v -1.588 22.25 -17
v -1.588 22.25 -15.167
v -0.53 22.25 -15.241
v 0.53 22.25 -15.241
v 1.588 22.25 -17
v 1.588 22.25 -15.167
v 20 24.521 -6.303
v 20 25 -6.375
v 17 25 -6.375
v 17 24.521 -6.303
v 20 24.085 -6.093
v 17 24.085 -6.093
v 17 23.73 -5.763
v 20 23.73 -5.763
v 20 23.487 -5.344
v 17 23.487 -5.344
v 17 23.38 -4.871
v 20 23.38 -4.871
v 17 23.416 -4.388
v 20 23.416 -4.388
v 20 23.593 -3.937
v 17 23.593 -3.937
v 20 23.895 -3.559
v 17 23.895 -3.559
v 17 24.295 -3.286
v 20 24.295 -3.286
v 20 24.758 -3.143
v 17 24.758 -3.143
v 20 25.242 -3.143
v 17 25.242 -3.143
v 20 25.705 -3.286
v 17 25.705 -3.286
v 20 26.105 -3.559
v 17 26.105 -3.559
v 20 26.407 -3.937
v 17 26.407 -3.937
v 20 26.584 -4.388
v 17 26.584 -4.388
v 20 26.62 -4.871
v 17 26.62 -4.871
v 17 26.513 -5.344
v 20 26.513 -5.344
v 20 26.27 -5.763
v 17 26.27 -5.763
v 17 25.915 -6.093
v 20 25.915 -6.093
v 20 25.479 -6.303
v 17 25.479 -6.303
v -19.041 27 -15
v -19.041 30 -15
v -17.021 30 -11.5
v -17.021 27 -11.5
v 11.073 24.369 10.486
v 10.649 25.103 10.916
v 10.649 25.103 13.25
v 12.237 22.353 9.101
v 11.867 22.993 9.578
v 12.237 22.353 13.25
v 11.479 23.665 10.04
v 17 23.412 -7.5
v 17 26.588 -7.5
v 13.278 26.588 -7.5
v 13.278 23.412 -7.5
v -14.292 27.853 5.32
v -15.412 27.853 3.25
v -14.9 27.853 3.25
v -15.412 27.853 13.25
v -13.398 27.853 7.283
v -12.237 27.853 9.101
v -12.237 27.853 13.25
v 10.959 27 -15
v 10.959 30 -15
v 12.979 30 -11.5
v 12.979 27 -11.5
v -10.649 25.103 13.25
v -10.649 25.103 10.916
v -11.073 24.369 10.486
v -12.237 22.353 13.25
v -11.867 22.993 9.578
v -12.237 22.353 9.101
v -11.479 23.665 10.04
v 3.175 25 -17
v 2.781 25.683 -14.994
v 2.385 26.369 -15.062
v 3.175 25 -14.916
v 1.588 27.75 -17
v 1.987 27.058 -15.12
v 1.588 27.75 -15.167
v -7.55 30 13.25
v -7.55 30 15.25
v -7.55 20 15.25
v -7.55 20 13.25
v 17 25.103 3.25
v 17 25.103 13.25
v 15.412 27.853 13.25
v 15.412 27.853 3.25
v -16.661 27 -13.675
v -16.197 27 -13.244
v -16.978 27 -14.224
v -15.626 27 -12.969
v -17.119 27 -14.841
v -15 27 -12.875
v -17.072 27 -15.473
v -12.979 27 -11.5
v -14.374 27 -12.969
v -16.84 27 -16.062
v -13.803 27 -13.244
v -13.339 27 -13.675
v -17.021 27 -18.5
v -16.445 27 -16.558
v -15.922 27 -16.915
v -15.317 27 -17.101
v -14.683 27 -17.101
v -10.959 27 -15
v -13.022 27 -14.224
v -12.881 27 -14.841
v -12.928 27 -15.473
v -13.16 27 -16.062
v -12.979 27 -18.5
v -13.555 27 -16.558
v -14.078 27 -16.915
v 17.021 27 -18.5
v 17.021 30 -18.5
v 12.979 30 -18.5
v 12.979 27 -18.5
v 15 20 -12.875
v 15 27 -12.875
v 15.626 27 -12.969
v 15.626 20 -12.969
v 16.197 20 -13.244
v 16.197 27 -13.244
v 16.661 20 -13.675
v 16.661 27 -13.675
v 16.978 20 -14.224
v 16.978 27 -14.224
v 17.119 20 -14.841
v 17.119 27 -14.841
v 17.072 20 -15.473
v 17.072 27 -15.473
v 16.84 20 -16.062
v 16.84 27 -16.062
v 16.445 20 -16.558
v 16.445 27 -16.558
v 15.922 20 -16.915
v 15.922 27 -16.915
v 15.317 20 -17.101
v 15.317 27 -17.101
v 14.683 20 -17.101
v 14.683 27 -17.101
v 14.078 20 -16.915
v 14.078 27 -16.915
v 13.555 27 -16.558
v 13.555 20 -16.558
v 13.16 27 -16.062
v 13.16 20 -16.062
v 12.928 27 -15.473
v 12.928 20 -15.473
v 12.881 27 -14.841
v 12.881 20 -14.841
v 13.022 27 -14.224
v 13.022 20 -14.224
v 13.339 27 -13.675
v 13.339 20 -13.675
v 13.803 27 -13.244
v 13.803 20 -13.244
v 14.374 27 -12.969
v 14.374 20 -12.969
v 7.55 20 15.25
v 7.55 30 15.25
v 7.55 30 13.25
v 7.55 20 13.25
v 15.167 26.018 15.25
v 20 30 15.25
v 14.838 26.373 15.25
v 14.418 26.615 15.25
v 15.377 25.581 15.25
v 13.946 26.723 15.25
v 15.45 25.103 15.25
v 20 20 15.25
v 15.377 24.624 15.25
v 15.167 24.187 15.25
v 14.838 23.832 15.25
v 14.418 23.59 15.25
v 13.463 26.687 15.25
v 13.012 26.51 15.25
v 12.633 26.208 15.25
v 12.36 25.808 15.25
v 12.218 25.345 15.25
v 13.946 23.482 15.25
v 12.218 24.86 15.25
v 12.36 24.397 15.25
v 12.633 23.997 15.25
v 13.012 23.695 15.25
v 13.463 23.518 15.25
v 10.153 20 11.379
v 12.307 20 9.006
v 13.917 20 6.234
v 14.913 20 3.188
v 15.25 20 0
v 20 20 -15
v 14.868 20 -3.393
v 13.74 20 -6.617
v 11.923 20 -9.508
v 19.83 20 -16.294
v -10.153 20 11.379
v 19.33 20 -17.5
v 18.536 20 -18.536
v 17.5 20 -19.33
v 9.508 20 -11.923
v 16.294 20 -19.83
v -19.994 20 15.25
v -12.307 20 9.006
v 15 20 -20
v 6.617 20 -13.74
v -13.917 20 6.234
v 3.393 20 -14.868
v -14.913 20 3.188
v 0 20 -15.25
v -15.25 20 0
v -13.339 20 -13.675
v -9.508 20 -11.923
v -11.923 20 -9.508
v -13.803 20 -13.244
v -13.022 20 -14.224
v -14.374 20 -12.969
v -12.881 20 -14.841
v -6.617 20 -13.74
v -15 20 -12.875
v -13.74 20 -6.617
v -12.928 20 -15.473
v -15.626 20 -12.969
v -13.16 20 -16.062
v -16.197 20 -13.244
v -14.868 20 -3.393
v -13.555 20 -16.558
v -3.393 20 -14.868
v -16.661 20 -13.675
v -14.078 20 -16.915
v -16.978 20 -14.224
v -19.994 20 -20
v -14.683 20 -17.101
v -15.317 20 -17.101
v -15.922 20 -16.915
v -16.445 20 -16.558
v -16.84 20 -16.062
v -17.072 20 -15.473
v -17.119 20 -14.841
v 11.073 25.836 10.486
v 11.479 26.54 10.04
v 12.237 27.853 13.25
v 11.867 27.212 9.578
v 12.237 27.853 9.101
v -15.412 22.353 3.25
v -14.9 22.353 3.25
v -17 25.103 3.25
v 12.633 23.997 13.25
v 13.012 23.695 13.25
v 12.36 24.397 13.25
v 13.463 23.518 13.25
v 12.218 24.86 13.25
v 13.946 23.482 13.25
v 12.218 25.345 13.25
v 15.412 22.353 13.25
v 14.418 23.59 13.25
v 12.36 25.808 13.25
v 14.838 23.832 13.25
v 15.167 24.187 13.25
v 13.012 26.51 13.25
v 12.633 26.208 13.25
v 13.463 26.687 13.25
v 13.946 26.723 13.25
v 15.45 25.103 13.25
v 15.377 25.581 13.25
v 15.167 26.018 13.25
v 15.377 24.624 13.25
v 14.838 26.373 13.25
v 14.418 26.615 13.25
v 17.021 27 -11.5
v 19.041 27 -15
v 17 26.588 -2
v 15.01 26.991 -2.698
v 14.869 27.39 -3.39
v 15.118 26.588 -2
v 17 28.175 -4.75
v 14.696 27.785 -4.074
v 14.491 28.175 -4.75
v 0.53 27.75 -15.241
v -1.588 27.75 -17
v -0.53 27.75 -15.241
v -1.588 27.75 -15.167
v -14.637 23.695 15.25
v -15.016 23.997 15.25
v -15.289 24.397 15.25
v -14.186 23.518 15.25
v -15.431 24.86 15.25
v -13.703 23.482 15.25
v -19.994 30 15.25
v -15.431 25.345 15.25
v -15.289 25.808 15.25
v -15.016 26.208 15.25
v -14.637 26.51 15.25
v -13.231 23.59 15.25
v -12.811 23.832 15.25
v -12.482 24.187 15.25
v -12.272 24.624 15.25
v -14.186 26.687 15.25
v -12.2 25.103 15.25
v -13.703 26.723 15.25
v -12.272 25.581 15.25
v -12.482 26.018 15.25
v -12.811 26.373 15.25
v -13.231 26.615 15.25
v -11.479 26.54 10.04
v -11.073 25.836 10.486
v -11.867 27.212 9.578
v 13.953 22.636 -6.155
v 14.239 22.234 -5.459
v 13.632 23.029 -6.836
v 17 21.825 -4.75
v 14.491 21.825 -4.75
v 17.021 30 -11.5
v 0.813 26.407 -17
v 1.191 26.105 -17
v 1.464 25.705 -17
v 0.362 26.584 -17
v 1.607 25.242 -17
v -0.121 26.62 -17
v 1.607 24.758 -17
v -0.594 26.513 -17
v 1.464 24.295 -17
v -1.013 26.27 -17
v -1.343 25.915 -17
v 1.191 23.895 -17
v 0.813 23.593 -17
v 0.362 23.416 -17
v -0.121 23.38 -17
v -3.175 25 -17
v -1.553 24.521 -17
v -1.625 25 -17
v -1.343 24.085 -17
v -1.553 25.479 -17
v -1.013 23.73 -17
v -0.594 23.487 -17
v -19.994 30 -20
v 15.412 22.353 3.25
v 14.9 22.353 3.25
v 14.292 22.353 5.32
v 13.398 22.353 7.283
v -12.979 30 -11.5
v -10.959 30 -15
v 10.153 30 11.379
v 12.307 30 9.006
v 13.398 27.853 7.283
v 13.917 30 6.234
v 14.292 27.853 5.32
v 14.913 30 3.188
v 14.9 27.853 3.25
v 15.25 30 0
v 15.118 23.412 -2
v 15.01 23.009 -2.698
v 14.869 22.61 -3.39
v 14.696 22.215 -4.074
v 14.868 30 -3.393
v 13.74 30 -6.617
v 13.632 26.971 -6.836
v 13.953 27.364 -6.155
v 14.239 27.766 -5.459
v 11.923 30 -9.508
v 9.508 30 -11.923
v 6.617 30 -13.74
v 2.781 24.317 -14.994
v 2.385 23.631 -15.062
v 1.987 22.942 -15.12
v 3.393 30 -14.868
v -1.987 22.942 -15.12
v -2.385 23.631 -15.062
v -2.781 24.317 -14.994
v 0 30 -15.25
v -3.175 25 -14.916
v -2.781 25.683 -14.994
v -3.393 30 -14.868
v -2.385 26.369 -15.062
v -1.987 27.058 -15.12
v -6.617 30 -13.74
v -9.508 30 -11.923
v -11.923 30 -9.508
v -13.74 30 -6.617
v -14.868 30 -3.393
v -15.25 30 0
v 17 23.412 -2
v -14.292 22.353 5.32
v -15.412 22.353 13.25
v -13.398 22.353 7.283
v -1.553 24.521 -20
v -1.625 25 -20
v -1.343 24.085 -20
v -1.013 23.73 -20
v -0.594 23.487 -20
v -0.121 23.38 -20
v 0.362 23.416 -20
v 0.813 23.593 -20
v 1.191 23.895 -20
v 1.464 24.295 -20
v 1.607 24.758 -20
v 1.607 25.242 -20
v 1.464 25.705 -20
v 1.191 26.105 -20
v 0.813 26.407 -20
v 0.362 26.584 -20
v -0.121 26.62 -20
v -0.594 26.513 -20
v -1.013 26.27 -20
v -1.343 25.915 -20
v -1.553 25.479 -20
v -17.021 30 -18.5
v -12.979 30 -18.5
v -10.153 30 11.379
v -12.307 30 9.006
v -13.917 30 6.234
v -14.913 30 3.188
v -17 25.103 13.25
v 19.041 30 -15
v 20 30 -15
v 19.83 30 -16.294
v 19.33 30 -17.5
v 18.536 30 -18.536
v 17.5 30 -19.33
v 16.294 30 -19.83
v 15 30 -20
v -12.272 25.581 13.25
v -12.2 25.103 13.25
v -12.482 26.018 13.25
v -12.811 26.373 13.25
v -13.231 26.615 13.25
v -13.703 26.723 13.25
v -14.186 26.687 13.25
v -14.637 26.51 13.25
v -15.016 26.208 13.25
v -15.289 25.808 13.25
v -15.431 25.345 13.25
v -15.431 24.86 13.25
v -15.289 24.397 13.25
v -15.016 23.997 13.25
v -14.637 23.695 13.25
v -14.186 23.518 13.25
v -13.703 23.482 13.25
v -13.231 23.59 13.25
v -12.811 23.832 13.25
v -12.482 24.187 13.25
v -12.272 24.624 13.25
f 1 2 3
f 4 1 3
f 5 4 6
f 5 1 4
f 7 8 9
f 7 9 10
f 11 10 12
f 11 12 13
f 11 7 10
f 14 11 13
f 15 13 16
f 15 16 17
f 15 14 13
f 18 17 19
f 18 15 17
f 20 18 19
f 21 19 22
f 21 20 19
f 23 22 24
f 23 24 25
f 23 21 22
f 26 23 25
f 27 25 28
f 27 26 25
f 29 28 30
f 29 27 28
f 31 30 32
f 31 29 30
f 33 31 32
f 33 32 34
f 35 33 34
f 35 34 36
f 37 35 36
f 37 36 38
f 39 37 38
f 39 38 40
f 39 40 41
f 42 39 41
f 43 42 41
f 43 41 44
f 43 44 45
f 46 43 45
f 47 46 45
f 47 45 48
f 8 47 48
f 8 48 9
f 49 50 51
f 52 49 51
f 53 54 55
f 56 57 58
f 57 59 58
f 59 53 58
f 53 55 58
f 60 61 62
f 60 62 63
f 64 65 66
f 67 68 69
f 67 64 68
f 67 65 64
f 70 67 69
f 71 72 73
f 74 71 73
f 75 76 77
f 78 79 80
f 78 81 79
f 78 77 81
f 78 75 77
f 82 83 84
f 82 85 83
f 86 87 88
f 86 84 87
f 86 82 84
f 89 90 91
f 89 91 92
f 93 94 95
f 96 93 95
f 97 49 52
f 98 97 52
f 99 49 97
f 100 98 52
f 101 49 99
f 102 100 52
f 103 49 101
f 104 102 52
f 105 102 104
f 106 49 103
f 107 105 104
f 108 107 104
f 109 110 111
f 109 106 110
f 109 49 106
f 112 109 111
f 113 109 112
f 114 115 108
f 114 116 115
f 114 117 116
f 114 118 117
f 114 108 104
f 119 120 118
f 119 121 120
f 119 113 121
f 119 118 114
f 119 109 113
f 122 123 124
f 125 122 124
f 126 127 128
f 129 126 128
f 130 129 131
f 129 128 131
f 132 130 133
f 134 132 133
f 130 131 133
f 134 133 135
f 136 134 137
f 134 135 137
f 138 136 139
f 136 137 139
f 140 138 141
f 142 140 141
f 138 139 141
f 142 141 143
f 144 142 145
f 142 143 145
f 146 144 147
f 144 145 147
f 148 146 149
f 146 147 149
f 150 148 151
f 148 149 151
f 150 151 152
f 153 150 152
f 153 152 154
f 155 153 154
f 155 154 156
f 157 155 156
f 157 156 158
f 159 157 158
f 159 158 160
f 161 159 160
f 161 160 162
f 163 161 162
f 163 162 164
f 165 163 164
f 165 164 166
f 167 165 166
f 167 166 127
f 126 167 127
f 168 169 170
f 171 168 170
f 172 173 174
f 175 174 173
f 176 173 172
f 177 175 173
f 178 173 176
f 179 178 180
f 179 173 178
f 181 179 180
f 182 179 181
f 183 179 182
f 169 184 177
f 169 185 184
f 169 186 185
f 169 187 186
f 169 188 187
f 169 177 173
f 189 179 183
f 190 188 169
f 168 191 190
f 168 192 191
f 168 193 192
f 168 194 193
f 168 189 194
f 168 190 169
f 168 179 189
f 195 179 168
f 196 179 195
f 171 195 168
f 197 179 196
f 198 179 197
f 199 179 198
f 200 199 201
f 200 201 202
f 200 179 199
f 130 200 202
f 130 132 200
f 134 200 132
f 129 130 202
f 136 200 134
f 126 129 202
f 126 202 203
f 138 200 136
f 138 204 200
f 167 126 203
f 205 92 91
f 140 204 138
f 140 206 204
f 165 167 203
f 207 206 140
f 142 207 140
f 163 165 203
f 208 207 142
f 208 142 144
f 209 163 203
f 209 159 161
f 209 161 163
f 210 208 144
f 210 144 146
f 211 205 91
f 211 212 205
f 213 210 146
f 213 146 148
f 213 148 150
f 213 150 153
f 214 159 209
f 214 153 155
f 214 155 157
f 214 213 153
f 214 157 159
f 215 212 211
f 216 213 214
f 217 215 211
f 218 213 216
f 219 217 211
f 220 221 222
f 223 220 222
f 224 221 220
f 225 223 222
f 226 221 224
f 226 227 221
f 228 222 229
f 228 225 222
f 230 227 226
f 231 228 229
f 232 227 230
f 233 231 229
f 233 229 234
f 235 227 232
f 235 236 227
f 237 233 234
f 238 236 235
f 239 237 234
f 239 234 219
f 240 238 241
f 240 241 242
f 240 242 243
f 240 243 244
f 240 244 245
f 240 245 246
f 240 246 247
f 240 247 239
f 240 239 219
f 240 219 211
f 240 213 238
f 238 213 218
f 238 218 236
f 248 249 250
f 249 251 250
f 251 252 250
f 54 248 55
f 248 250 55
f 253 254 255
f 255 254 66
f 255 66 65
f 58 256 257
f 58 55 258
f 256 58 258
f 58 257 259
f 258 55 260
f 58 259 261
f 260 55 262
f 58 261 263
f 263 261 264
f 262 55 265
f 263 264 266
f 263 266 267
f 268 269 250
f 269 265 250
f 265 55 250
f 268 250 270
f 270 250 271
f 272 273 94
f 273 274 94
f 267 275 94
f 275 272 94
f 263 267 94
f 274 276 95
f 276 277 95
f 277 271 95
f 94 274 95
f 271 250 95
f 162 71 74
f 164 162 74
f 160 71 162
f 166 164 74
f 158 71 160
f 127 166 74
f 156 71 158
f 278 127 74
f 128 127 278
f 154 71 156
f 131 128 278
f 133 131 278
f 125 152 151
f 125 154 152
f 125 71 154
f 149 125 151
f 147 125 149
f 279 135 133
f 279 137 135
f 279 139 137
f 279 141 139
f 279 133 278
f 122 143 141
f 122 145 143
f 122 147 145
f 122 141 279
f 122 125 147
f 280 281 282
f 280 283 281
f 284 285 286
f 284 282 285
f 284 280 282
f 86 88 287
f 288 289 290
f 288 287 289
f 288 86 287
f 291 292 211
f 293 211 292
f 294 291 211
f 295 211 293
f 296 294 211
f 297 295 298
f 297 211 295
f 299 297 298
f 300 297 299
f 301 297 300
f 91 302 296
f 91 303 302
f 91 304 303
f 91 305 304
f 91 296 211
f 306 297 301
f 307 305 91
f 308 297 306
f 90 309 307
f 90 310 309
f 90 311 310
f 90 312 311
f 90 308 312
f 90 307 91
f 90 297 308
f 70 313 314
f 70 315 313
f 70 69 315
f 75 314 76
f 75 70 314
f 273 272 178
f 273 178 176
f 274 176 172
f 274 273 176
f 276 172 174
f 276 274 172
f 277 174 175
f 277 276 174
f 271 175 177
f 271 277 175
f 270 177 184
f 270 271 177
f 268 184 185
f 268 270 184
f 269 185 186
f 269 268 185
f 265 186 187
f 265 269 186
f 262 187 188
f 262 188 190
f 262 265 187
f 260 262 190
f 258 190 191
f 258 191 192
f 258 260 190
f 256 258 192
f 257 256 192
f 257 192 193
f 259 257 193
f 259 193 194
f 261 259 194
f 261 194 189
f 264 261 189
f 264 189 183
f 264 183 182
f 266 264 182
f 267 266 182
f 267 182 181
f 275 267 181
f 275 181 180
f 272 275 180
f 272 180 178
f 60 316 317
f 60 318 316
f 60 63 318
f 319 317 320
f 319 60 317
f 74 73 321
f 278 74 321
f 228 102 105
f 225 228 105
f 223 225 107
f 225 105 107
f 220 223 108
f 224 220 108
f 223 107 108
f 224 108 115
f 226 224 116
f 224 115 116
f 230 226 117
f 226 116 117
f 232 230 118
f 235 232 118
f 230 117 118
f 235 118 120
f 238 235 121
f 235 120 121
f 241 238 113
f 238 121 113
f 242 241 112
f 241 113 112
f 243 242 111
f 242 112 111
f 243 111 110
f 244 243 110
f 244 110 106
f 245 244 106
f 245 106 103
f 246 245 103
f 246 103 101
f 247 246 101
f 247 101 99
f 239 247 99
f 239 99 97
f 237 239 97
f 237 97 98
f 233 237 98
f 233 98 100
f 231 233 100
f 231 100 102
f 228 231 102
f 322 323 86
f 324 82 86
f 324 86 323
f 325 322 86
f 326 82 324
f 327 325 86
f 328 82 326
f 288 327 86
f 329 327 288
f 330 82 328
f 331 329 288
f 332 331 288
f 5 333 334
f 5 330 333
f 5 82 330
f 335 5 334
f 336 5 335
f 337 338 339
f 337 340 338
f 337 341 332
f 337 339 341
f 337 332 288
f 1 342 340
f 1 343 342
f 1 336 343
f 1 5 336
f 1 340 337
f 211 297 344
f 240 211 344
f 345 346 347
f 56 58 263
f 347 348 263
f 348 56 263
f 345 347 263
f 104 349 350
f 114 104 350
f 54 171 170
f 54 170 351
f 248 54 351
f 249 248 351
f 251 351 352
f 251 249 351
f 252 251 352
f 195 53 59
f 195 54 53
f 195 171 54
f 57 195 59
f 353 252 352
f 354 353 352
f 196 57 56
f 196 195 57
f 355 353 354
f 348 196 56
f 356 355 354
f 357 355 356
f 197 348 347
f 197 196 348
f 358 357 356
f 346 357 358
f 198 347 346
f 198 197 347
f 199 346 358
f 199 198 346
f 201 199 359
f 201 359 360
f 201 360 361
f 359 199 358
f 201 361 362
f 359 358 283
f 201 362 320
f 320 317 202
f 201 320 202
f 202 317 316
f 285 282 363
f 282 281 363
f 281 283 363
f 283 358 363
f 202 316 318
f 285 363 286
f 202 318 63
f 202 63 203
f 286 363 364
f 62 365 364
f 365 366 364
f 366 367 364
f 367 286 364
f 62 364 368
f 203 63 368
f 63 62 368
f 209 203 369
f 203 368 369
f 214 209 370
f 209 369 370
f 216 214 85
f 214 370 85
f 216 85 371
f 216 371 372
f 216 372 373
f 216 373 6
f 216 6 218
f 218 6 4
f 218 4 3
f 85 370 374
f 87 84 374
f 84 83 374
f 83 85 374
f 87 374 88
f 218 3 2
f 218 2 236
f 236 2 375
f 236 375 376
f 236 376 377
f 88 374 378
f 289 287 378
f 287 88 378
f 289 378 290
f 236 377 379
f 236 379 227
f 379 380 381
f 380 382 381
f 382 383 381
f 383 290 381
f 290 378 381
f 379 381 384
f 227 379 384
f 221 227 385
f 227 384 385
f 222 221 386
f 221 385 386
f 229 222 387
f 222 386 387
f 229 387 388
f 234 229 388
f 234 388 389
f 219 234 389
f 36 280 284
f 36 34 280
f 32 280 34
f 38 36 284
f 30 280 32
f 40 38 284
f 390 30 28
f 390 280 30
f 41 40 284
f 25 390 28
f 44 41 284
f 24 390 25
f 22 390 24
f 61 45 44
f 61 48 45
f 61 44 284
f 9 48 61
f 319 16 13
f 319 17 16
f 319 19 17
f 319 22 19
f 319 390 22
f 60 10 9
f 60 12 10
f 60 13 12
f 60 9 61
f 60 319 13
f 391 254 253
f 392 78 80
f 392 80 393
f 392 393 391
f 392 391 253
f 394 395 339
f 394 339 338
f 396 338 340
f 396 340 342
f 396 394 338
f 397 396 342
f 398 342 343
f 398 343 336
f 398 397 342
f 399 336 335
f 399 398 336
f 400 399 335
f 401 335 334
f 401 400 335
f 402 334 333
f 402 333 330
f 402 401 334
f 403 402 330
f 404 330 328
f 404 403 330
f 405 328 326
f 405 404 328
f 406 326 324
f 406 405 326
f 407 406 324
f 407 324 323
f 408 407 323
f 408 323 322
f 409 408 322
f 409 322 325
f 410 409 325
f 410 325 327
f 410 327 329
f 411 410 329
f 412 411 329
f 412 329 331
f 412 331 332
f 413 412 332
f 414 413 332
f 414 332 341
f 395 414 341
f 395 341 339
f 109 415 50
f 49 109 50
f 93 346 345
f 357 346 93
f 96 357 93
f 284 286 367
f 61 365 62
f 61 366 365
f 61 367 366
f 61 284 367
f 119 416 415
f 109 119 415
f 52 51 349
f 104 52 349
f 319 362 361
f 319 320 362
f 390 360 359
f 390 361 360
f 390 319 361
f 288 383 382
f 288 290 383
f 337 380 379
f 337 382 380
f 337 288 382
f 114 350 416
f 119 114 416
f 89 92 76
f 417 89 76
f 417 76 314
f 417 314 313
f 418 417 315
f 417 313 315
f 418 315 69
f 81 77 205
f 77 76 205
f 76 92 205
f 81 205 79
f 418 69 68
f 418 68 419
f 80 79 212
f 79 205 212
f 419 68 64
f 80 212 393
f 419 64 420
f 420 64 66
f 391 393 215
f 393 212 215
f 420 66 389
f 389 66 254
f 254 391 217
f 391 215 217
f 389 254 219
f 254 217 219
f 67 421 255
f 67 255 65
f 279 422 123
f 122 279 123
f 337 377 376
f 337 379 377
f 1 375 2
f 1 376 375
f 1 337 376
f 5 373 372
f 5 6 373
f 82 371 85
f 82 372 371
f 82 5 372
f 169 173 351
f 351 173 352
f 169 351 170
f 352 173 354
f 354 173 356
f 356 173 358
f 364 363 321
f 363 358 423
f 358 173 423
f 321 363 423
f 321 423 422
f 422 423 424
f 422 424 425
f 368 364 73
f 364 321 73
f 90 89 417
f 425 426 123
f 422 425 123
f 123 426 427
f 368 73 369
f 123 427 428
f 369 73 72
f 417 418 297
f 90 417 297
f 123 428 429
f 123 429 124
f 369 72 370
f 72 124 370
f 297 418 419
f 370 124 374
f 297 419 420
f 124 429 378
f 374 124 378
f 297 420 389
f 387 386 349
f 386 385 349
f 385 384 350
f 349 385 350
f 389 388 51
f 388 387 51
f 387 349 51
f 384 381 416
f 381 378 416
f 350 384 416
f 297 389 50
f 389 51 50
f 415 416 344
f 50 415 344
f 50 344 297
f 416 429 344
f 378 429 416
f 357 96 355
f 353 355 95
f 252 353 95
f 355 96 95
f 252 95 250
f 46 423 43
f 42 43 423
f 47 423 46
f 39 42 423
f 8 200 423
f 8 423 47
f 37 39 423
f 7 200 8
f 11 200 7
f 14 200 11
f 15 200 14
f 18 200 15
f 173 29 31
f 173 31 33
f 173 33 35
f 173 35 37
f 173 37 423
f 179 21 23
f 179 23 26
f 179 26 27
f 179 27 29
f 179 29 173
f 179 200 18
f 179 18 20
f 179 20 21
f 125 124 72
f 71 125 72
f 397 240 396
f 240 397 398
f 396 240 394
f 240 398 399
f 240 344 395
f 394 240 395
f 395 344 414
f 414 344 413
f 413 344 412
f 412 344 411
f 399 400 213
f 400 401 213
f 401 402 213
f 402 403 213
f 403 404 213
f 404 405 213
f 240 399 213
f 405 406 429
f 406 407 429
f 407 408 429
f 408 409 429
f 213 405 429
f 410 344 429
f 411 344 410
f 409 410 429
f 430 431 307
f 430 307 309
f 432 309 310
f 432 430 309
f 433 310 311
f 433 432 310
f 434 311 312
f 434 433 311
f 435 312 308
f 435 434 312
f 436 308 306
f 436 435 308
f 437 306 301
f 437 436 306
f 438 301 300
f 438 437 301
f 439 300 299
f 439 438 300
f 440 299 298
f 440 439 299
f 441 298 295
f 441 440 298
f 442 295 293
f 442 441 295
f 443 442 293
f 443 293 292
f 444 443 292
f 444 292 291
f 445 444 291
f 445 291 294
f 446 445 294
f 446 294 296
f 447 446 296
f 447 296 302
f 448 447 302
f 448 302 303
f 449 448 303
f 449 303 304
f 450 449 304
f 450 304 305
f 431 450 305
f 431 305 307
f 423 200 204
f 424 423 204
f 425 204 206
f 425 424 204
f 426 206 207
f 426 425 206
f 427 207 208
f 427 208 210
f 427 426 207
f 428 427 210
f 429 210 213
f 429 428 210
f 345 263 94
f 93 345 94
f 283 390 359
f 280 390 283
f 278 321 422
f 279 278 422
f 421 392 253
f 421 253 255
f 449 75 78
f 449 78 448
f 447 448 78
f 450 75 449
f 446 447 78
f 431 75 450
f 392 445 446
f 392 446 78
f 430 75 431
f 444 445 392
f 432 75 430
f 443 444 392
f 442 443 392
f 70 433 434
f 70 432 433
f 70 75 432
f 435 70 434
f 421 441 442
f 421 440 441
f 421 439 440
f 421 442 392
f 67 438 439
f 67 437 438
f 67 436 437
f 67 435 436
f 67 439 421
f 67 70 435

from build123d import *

# Parameters (mm, degrees)
CROQUIS1_R                              = 15.25
CROQUIS1_R_2                            = 2.125
SOPORTE_CAJA_REDUCTORA_DEPTH            = 20
CROQUIS3_R                              = 2.125
CORTAR_EXTRUIR1_DEPTH                   = 51.423828692
REDONDEO1_R                             = 5
BOSS_EXTRUDE1_DEPTH                     = 20
CUT_EXTRUDE1_REACH                      = 55.852
SKETCH2_R                               = 1.625
CUT_EXTRUDE2_DEPTH                      = 2
SKETCH4_R                               = 1.625
CUT_EXTRUDE3_DEPTH                      = 63.291652731
CUT_EXTRUDE4_START                      = -4.5
CUT_EXTRUDE4_DEPTH                      = 2
CROQUIS6_W                              = 4.75
CROQUIS6_H                              = 4.75
CORTAR_EXTRUIR17_DEPTH                  = 42.231056256
CROQUIS7_W                              = 60
CROQUIS7_H                              = 20
CORTAR_EXTRUIR18_DEPTH                  = 51.423828692
SALIENTE_EXTRUIR2_DEPTH                 = 49
SOPORTE_START                           = -15
SOPORTE_MOTOR_DEPTH                     = 15
CROQUIS12_R                             = 2.125
AGUJEROS_DE_SUJECION_A_BASE_DEPTH       = 84.087679592
TUERCA_START                            = -4
TUERCA_AGUJERO_DE_SUJECION_A_BASE_DEPTH = 10
SALIENTE_EXTRUIR4_DEPTH                 = 15
CORTAR_EXTRUIR19_DEPTH                  = 25
CROQUIS14_W                             = 50
CROQUIS14_H                             = 118
CORTAR_EXTRUIR22_DEPTH                  = 146.556045907
CROQUIS15_W                             = 10
CROQUIS15_H                             = 7
CORTAR_EXTRUIR23_DEPTH                  = 42.231056256
CORTAR_EXTRUIR24_DEPTH                  = 42.231056256
CROQUIS18_W                             = 40
CROQUIS18_H                             = 10
CORTAR_EXTRUIR25_DEPTH                  = 44.27311521
SALIENTE_EXTRUIR5_DEPTH                 = 10
CROQUIS20_R                             = 1
CORTAR_EXTRUIR26_DEPTH                  = 49.229270158
CORTAR_EXTRUIR27_REACH                  = 62.959
CORTAR_EXTRUIR27_END_RADIUS             = 15.25
CROQUIS21_R                             = 1.625
CROQUIS22_R                             = 2.125
CROQUIS22_R_2                           = 1
SALIENTE_EXTRUIR6_DEPTH                 = 10
CROQUIS23_R                             = 1.625
CORTAR_EXTRUIR28_DEPTH                  = 52.269508521
CORTAR_EXTRUIR29_START                  = -3
CORTAR_EXTRUIR29_DEPTH                  = 10
SALIENTE_EXTRUIR7_DEPTH                 = 10
CORTAR_EXTRUIR30_REACH                  = 72.235
CROQUIS27_R                             = 1.625
CORTAR_EXTRUIR31_REACH                  = 75.235
CORTAR_EXTRUIR31_START                  = -3
CORTAR_EXTRUIR32_REACH                  = 58.612
CROQUIS29_R                             = 1.625
CORTAR_EXTRUIR33_REACH                  = 61.112
CORTAR_EXTRUIR33_START                  = -2.5
CROQUIS35_W                             = 13.305418987
CROQUIS35_H                             = 6.826864192
CORTAR_EXTRUIR34_DEPTH                  = 63.931555098
CORTAR_EXTRUIR34_DEPTH_BACK             = 63.931555098
CORTAR_EXTRUIR35_START                  = -3
CORTAR_EXTRUIR35_DEPTH                  = 10
SALIENTE_EXTRUIR8_DEPTH                 = 10
SALIENTE_EXTRUIR9_DEPTH                 = 13
SALIENTE_EXTRUIR10_DEPTH                = 3
CROQUIS40_W                             = 106.583537839
CROQUIS40_H                             = 47.391515964
CORTAR_EXTRUIR36_DEPTH                  = 80.887064817
CORTAR_EXTRUIR36_DEPTH_BACK             = 80.887064817
CORTAR_EXTRUIR37_DEPTH                  = 67.2524009
CORTAR_EXTRUIR37_DEPTH_BACK             = 67.2524009
CORTAR_EXTRUIR38_DEPTH                  = 79.704784639
CORTAR_EXTRUIR38_DEPTH_BACK             = 79.704784639
SALIENTE_EXTRUIR11_DEPTH                = 10
CORTAR_EXTRUIR39_DEPTH                  = 63.9908649
CROQUIS45_W                             = 31.470301378
CROQUIS45_H                             = 10
CROQUIS45_R                             = 1.625
SALIENTE_EXTRUIR12_DEPTH                = 2.5
SALIENTE_EXTRUIR13_DEPTH                = 10
CORTAR_EXTRUIR40_START                  = -2
CROQUIS47_R                             = 1.625
CORTAR_EXTRUIR40_DEPTH                  = 10
CORTAR_EXTRUIR41_START                  = -12
CROQUIS48_R                             = 1.625
CORTAR_EXTRUIR41_DEPTH                  = 12
CORTAR_EXTRUIR42_DEPTH                  = 3
CROQUIS50_R                             = 2.125
CORTAR_EXTRUIR43_DEPTH                  = 52.795622989
CORTAR_EXTRUIR43_DEPTH_BACK             = 52.795622989
CORTAR_EXTRUIR44_DEPTH                  = 52.795622989
CORTAR_EXTRUIR44_DEPTH_BACK             = 52.795622989
SALIENTE_EXTRUIR14_DEPTH                = 10
CORTAR_EXTRUIR45_START                  = -24.591895
CORTAR_EXTRUIR45_DEPTH                  = 17.091895
CROQUIS55_W                             = 28.124395824
CROQUIS55_H                             = 43.73373215
CORTAR_EXTRUIR46_DEPTH                  = 42.681058385
CORTAR_EXTRUIR46_DEPTH_BACK             = 42.681058385


with BuildPart() as part:
    # Croquis1 → Soporte caja reductora (new body)
    with BuildSketch(Plane(origin=(0, 0, 0), x_dir=(1, 0, 0), z_dir=(0, 1, 0))):
        Polygon((-30, -15.25), (-20, -15.25), (-20, -20), (20, -20), (20, -15.25), (30, -15.25), (30, -7.25), (20, -4.25), (20, 20), (-20, 20), (-20, -4.25), (-30, -7.25), align=None)
        with Locations(Location((0, 0, 0), (0, 0, 270))):
            Circle(CROQUIS1_R, mode=Mode.SUBTRACT)
        with Locations(Location((-15, 15, 0), (0, 0, 270))):
            Circle(CROQUIS1_R_2, mode=Mode.SUBTRACT)
        with Locations(Location((15, 15, 0), (0, 0, 270))):
            Circle(CROQUIS1_R_2, mode=Mode.SUBTRACT)
    extrude(amount=-SOPORTE_CAJA_REDUCTORA_DEPTH)

    # Croquis3 → Cortar-Extruir1 (cut, through all)
    with BuildSketch(Plane.XY.offset(15.25)):
        with Locations((-23.5, -10)):
            Circle(CROQUIS3_R)
        with Locations((23.5, -10)):
            Circle(CROQUIS3_R)
    extrude(amount=-CORTAR_EXTRUIR1_DEPTH, mode=Mode.SUBTRACT)

    # Redondeo1
    redondeo1_edges = [part.edges().sort_by_distance(p)[0] for p in [
        (-20, -10, -20),
        (20, -10, -20),
    ]]
    fillet(redondeo1_edges, radius=REDONDEO1_R)

    # Sketch1 → Boss-Extrude1 (add)
    with BuildSketch(Plane(origin=(0, 0, 0), x_dir=(1, 0, 0), z_dir=(0, 1, 0))):
        with BuildLine():
            Line((25.5, 15), (20, 15))
            ThreePointArc((20, 15), (18.535533906, 18.535533906), (15, 20))
            Line((15, 20), (30, 20))
            Line((30, 20), (30, 8))
            Line((30, 8), (25.5, 8))
            Line((25.5, 8), (25.5, 15))
        make_face()
    extrude(amount=-BOSS_EXTRUDE1_DEPTH)

    # Sketch2 → Cut-Extrude1 (cut, up to next)
    with BuildSketch(Plane(origin=(0, 0, -20), x_dir=(-1, 0, 0), z_dir=(0, 0, -1)), mode=Mode.PRIVATE) as cut_extrude1_sk1:
        with Locations((-22.75, -10)):
            Circle(SKETCH2_R)
    cut_extrude1_tool1 = extrude(cut_extrude1_sk1.sketch, amount=-CUT_EXTRUDE1_REACH, mode=Mode.PRIVATE) & part.part
    add(cut_extrude1_tool1.solids().sort_by_distance((22.75, -10, -20))[0], mode=Mode.SUBTRACT)

    # Sketch3 → Cut-Extrude2 (cut)
    with BuildSketch(Plane.XY.offset(-15)):
        Polygon((20, -11.58771324), (22.75, -13.175426481), (25.5, -11.58771324), (25.5, -8.41228676), (22.75, -6.824573519), (20, -8.41228676), align=None)
    extrude(amount=-CUT_EXTRUDE2_DEPTH, mode=Mode.SUBTRACT)

    # Sketch4 → Cut-Extrude3 (cut, through all)
    with BuildSketch(Plane.ZY.offset(-25.5)):
        with Locations((-12.25, -10)):
            Circle(SKETCH4_R)
    extrude(amount=-CUT_EXTRUDE3_DEPTH, mode=Mode.SUBTRACT)

    # Sketch5 → Cut-Extrude4 (cut)
    with BuildSketch(Plane(origin=(30, 0, 0), x_dir=(0, 0, -1), z_dir=(1, 0, 0)).offset(CUT_EXTRUDE4_START)):
        Polygon((15, -11.58771324), (15, -8.41228676), (12.25, -6.824573519), (9.5, -8.41228676), (9.5, -11.58771324), (12.25, -13.175426481), align=None)
    extrude(amount=CUT_EXTRUDE4_DEPTH, mode=Mode.SUBTRACT)

    # Croquis6 → Cortar-Extruir17 (cut, through all)
    with BuildSketch(Plane(origin=(0, 0, 0), x_dir=(1, 0, 0), z_dir=(0, 1, 0))):
        Polygon((0, -15.25), (-15.25, -15.25), (-15.25, -20), (15.25, -20), (15.25, -15.25), align=None)
        with Locations((-17.625, -17.625)):
            Rectangle(CROQUIS6_W, CROQUIS6_H)
        with BuildLine():
            ThreePointArc((0, -15.25), (-10.783378413, -10.783378413), (-15.25, 0))
            Line((-15.25, 0), (-15.25, -15.25))
            Line((-15.25, -15.25), (0, -15.25))
        make_face()
        with BuildLine():
            Line((15.25, -15.25), (15.25, 0))
            ThreePointArc((15.25, 0), (10.783378413, -10.783378413), (0, -15.25))
            Line((0, -15.25), (15.25, -15.25))
        make_face()
        with Locations((17.625, -17.625)):
            Rectangle(CROQUIS6_W, CROQUIS6_H)
    extrude(amount=-CORTAR_EXTRUIR17_DEPTH, mode=Mode.SUBTRACT)


with BuildPart() as body_2:
    # Simetría1: mirrored copy
    add(part.part.mirror(Plane.ZX))

    # Croquis8 → Saliente-Extruir2 (add)
    with BuildSketch(Plane(origin=(0, 20, 0), x_dir=(1, 0, 0), z_dir=(0, 1, 0))):
        with BuildLine():
            Line((-12.664515522, 20), (-11.040489496, 13.939052358))
            Line((-11.040489496, 13.939052358), (-10.315162126, 11.232093763))
            ThreePointArc((-10.315162126, 11.232093763), (0, 15.25), (10.315162126, 11.232093763))
            Line((10.315162126, 11.232093763), (10.817418481, 13.87928066))
            Line((10.817418481, 13.87928066), (11.978715476, 20))
            Line((11.978715476, 20), (-12.664515522, 20))
        make_face()
    extrude(amount=SALIENTE_EXTRUIR2_DEPTH)

    # Croquis9 → Soporte motor (add)
    with BuildSketch(Plane(origin=(0, 69, 0), x_dir=(1, 0, 0), z_dir=(0, 1, 0)).offset(SOPORTE_START)):
        with BuildLine():
            Line((-20, 15), (-20, -4.25))
            Line((-20, -4.25), (-30, -7.25))
            Line((-30, -7.25), (-30, -15.25))
            Line((-30, -15.25), (0, -15.25))
            Line((0, -15.25), (0, -14.75))
            ThreePointArc((0, -14.75), (-10.429825023, 10.429825023), (14.75, 0))
            Line((14.75, 0), (20, 0))
            Line((20, 0), (20, 13.936837101))
            Line((20, 13.936837101), (12.664515522, 20))
            Line((12.664515522, 20), (-15, 20))
            ThreePointArc((-15, 20), (-18.535533906, 18.535533906), (-20, 15))
        make_face()
    extrude(amount=-SOPORTE_MOTOR_DEPTH)

    # Croquis12 → Agujeros de sujecion a base (cut, through all)
    with BuildSketch(Plane.XY.offset(15.25)):
        with Locations((-23.5, 46.5)):
            Circle(CROQUIS12_R)
    extrude(amount=-AGUJEROS_DE_SUJECION_A_BASE_DEPTH, mode=Mode.SUBTRACT)

    # Croquis13 → Tuerca Agujero de sujecion a base (cut)
    with BuildSketch(Plane.XY.offset(15.25).offset(TUERCA_START)):
        Polygon((-20, 44.479274058), (-20, 48.520725942), (-23.5, 50.541451884), (-27, 48.520725942), (-27, 44.479274058), (-23.5, 42.458548116), align=None)
    extrude(amount=-TUERCA_AGUJERO_DE_SUJECION_A_BASE_DEPTH, mode=Mode.SUBTRACT)

    # Croquis10 → Saliente-Extruir4 (add)
    with BuildSketch(Plane(origin=(0, 69, 0), x_dir=(1, 0, 0), z_dir=(0, 1, 0))):
        with BuildLine():
            ThreePointArc((10.315162126, 11.232093763), (0, 15.25), (-10.315162126, 11.232093763))
            Line((-10.315162126, 11.232093763), (-10.16850369, 10.684757026))
            ThreePointArc((-10.16850369, 10.684757026), (0, 14.75), (10.16850369, 10.684757026))
            Line((10.16850369, 10.684757026), (10.315162126, 11.232093763))
        make_face()
    extrude(amount=-SALIENTE_EXTRUIR4_DEPTH)

    # Croquis11 → Cortar-Extruir19 (cut)
    with BuildSketch(Plane.XZ):
        with BuildLine():
            Line((15.25, 4.25), (20, 4.25))
            Line((20, 4.25), (21.972856468, 4.84185694))
            ThreePointArc((21.972856468, 4.84185694), (19.948931102, 10.40625523), (16.543503257, 15.25))
            Line((16.543503257, 15.25), (15.25, 15.25))
            Line((15.25, 15.25), (15.25, 4.25))
        make_face()
        with BuildLine():
            Line((21.972856468, 4.84185694), (30, 7.25))
            Line((30, 7.25), (30, 15.25))
            Line((30, 15.25), (16.543503257, 15.25))
            ThreePointArc((16.543503257, 15.25), (19.948931102, 10.40625523), (21.972856468, 4.84185694))
        make_face()
        with BuildLine():
            ThreePointArc((20, -15), (18.535533906, -18.535533906), (15, -20))
            Line((15, -20), (30, -20))
            Line((30, -20), (30, -8))
            Line((30, -8), (25.5, -8))
            Line((25.5, -8), (25.5, -15))
            Line((25.5, -15), (20, -15))
        make_face()
    extrude(amount=-CORTAR_EXTRUIR19_DEPTH, mode=Mode.SUBTRACT)

    # Simetría2: body 2 across face


with BuildPart() as part_1:
    add(part.part)

    # Croquis7 → Cortar-Extruir18 (cut, through all)
    with BuildSketch(Plane(origin=(0, 0, -20), x_dir=(-1, 0, 0), z_dir=(0, 0, -1))):
        with Locations((0, -10)):
            Rectangle(CROQUIS7_W, CROQUIS7_H)
    extrude(amount=-CORTAR_EXTRUIR18_DEPTH, mode=Mode.SUBTRACT)


with BuildPart() as body_2_1:
    add(body_2.part)
    add(body_2.part.mirror(Plane(origin=(-0.229209569, 69, -16.663998028), x_dir=(0, 0, 1), z_dir=(0, 1, 0))))

    # Croquis14 → Cortar-Extruir22 (cut, through all)
    with BuildSketch(Plane.XY.offset(15.25)):
        with Locations((-5, 79)):
            Rectangle(CROQUIS14_W, CROQUIS14_H)
    extrude(amount=-CORTAR_EXTRUIR22_DEPTH, mode=Mode.SUBTRACT)

    # Croquis15 → Cortar-Extruir23 (cut, through all)
    with BuildSketch(Plane.XZ):
        with Locations((-25, 7.75)):
            Rectangle(CROQUIS15_W, CROQUIS15_H)
    extrude(amount=-CORTAR_EXTRUIR23_DEPTH, mode=Mode.SUBTRACT)

    # Croquis16 → Cortar-Extruir24 (cut, through all)
    with BuildSketch(Plane.XZ):
        Polygon((-30, 15.25), (-15.25, 15.25), (-15.25, 12.75), (-20, 12.75), (-20, 11.25), (-30, 11.25), (-30, 12.75), align=None)
    extrude(amount=-CORTAR_EXTRUIR24_DEPTH, mode=Mode.SUBTRACT)

    # Croquis18 → Cortar-Extruir25 (cut, through all)
    with BuildSketch(Plane(origin=(0, 0, -20), x_dir=(-1, 0, 0), z_dir=(0, 0, -1))):
        with Locations((0, 5)):
            Rectangle(CROQUIS18_W, CROQUIS18_H)
    extrude(amount=-CORTAR_EXTRUIR25_DEPTH, mode=Mode.SUBTRACT)

    # Croquis19 → Saliente-Extruir5 (add)
    with BuildSketch(Plane(origin=(0, 20, 0), x_dir=(1, 0, 0), z_dir=(0, 1, 0))):
        Polygon((-20, -12.75), (-34, -12.75), (-34, -7.75), (-24, -7.75), (-20, -3.75), align=None)
    extrude(amount=-SALIENTE_EXTRUIR5_DEPTH)

    # Croquis20 → Cortar-Extruir26 (cut, through all)
    with BuildSketch(Plane(origin=(0, 0, 7.75), x_dir=(-1, 0, 0), z_dir=(0, 0, -1))):
        with Locations((29, 15)):
            Circle(CROQUIS20_R)
    extrude(amount=-CORTAR_EXTRUIR26_DEPTH, mode=Mode.SUBTRACT)

    # Cortar-Extruir27: up to this cylinder (the profile starts outside it)
    cortar_extruir27_end = Plane(origin=(0, 15, 0), z_dir=(0, -1, 0)) * Cylinder(CORTAR_EXTRUIR27_END_RADIUS, 157.418, mode=Mode.PRIVATE)
    # Croquis21 → Cortar-Extruir27 (cut, up to the surface)
    with BuildSketch(Plane(origin=(20, 0, 0), x_dir=(0, 0, -1), z_dir=(1, 0, 0)), mode=Mode.PRIVATE) as cortar_extruir27_sk1:
        with Locations((4.75, 15)):
            Circle(CROQUIS21_R)
    cortar_extruir27_tool1 = extrude(cortar_extruir27_sk1.sketch, amount=-CORTAR_EXTRUIR27_REACH, mode=Mode.PRIVATE) - cortar_extruir27_end
    add(cortar_extruir27_tool1.solids().sort_by_distance((20, 15, -4.75))[0], mode=Mode.SUBTRACT)

    # Croquis22 → Saliente-Extruir6 (add)
    with BuildSketch(Plane.XZ.offset(-10)):
        with Locations((-15, -15)):
            Circle(CROQUIS22_R)
        with Locations(Location((-15, -15, 0), (0, 0, 270))):
            Circle(CROQUIS22_R_2, mode=Mode.SUBTRACT)
        with Locations((15, -15)):
            Circle(CROQUIS22_R)
        with Locations(Location((15, -15, 0), (0, 0, 270))):
            Circle(CROQUIS22_R_2, mode=Mode.SUBTRACT)
    extrude(amount=-SALIENTE_EXTRUIR6_DEPTH)

    # Croquis23 → Cortar-Extruir28 (cut, through all)
    with BuildSketch(Plane(origin=(0, 0, -20), x_dir=(-1, 0, 0), z_dir=(0, 0, -1))):
        with Locations((0, 15)):
            Circle(CROQUIS23_R)
    extrude(amount=-CORTAR_EXTRUIR28_DEPTH, mode=Mode.SUBTRACT)

    # Croquis24 → Cortar-Extruir29 (cut)
    with BuildSketch(Plane(origin=(0, 0, -20), x_dir=(-1, 0, 0), z_dir=(0, 0, -1)).offset(CORTAR_EXTRUIR29_START)):
        Polygon((1.58771324, 12.25), (3.175426481, 15), (1.58771324, 17.75), (-1.58771324, 17.75), (-3.175426481, 15), (-1.58771324, 12.25), align=None)
    extrude(amount=-CORTAR_EXTRUIR29_DEPTH, mode=Mode.SUBTRACT)

    # Croquis26 → Saliente-Extruir7 (add)
    with BuildSketch(Plane.XZ.offset(-10)):
        Polygon((-34, 7.75), (-34, 12.75), (-58.825, 12.75), (-39.160527763, -4.104491148), (-20, -4.104491148), (-20, -0.104491148), (-35.732113118, -0.104491148), (-29, 7.75), align=None)
        Polygon((-34.268209086, 7.75), (-39.594516123, 1.535690951), (-46.844874897, 7.75), align=None, mode=Mode.SUBTRACT)
    extrude(amount=-SALIENTE_EXTRUIR7_DEPTH)

    # Croquis27 → Cortar-Extruir30 (cut, up to next)
    with BuildSketch(Plane.XY.offset(12.75), mode=Mode.PRIVATE) as cortar_extruir30_sk1:
        with Locations((-40.544874897, 15)):
            Circle(CROQUIS27_R)
    cortar_extruir30_tool1 = extrude(cortar_extruir30_sk1.sketch, amount=-CORTAR_EXTRUIR30_REACH, mode=Mode.PRIVATE) & body_2_1.part
    # Croquis27 → Cortar-Extruir30 (cut, up to next)
    with BuildSketch(Plane.XY.offset(12.75), mode=Mode.PRIVATE) as cortar_extruir30_sk2:
        with Locations((-29, 15)):
            Circle(CROQUIS27_R)
    cortar_extruir30_tool2 = extrude(cortar_extruir30_sk2.sketch, amount=-CORTAR_EXTRUIR30_REACH, mode=Mode.PRIVATE) & body_2_1.part
    add(cortar_extruir30_tool1.solids().sort_by_distance((-40.544875, 15, 12.75))[0], mode=Mode.SUBTRACT)
    add(cortar_extruir30_tool2.solids().sort_by_distance((-29, 15, 12.75))[0], mode=Mode.SUBTRACT)

    # Croquis28 → Cortar-Extruir31 (cut, up to next)
    with BuildSketch(Plane.XY.offset(12.75).offset(CORTAR_EXTRUIR31_START), mode=Mode.PRIVATE) as cortar_extruir31_sk1:
        Polygon((-38.957161657, 12.25), (-37.369448416, 15), (-38.957161657, 17.75), (-42.132588137, 17.75), (-43.720301378, 15), (-42.132588137, 12.25), align=None)
    cortar_extruir31_tool1 = extrude(cortar_extruir31_sk1.sketch, amount=-CORTAR_EXTRUIR31_REACH, mode=Mode.PRIVATE) & body_2_1.part
    # Croquis28 → Cortar-Extruir31 (cut, up to next)
    with BuildSketch(Plane.XY.offset(12.75).offset(CORTAR_EXTRUIR31_START), mode=Mode.PRIVATE) as cortar_extruir31_sk2:
        Polygon((-27.41228676, 12.25), (-25.824573519, 15), (-27.41228676, 17.75), (-30.58771324, 17.75), (-32.175426481, 15), (-30.58771324, 12.25), align=None)
    cortar_extruir31_tool2 = extrude(cortar_extruir31_sk2.sketch, amount=-CORTAR_EXTRUIR31_REACH, mode=Mode.PRIVATE) & body_2_1.part
    add(cortar_extruir31_tool1.solids().sort_by_distance((-40.544875, 15, 9.75))[0], mode=Mode.SUBTRACT)
    add(cortar_extruir31_tool2.solids().sort_by_distance((-29, 15, 9.75))[0], mode=Mode.SUBTRACT)

    # Croquis29 → Cortar-Extruir32 (cut, up to next)
    with BuildSketch(Plane(origin=(-18.612848159, 0, -21.715982563), x_dir=(-0.7592713073348843, 0, 0.6507742172658468), z_dir=(-0.6507742172658468, 0, -0.7592713073348843)), mode=Mode.PRIVATE) as cortar_extruir32_sk1:
        with Locations((33.812368097, 15)):
            Circle(CROQUIS29_R)
    cortar_extruir32_tool1 = extrude(cortar_extruir32_sk1.sketch, amount=-CORTAR_EXTRUIR32_REACH, mode=Mode.PRIVATE) & body_2_1.part
    add(cortar_extruir32_tool1.solids().sort_by_distance((-44.285609, 15, 0.288235))[0], mode=Mode.SUBTRACT)

    # Croquis31 → Cortar-Extruir33 (cut, up to next)
    with BuildSketch(Plane(origin=(-18.612848159, 0, -21.715982563), x_dir=(-0.7592713073348843, 0, 0.6507742172658468), z_dir=(-0.6507742172658468, 0, -0.7592713073348843)).offset(CORTAR_EXTRUIR33_START), mode=Mode.PRIVATE) as cortar_extruir33_sk1:
        Polygon((36.562368097, 16.58771324), (33.812368097, 18.175426481), (31.062368097, 16.58771324), (31.062368097, 13.41228676), (33.812368097, 11.824573519), (36.562368097, 13.41228676), align=None)
    cortar_extruir33_tool1 = extrude(cortar_extruir33_sk1.sketch, amount=-CORTAR_EXTRUIR33_REACH, mode=Mode.PRIVATE) & body_2_1.part
    add(cortar_extruir33_tool1.solids().sort_by_distance((-42.658674, 15, 2.186413))[0], mode=Mode.SUBTRACT)

    # Croquis35 → Cortar-Extruir34 (cut, two sides)
    with BuildSketch(Plane(origin=(0, 20, 0), x_dir=(1, 0, 0), z_dir=(0, 1, 0))) as cortar_extruir34_sk:
        with Locations((17.04227466, -3.413432096)):
            Rectangle(CROQUIS35_W, CROQUIS35_H)
    extrude(amount=CORTAR_EXTRUIR34_DEPTH, mode=Mode.SUBTRACT)
    extrude(cortar_extruir34_sk.sketch, amount=-CORTAR_EXTRUIR34_DEPTH_BACK, mode=Mode.SUBTRACT)

    # Croquis36 → Cortar-Extruir35 (cut)
    with BuildSketch(Plane(origin=(20, 0, 0), x_dir=(0, 0, -1), z_dir=(1, 0, 0)).offset(CORTAR_EXTRUIR35_START)):
        Polygon((7.5, 16.58771324), (4.75, 18.175426481), (2, 16.58771324), (2, 13.41228676), (4.75, 11.824573519), (7.5, 13.41228676), align=None)
    extrude(amount=-CORTAR_EXTRUIR35_DEPTH, mode=Mode.SUBTRACT)

    # Croquis37 → Saliente-Extruir8 (add)
    with BuildSketch(Plane.XZ.offset(-10)):
        Polygon((-39.160527763, -4.104491148), (-20.614919368, -20), (-15, -20), (-19.558128305, -15.637570403), (-33.014002756, -4.104491148), align=None)
    extrude(amount=-SALIENTE_EXTRUIR8_DEPTH)

    # Croquis38 → Saliente-Extruir9 (add)
    with BuildSketch(Plane.XZ.offset(-10)):
        Polygon((-58.825, 12.75), (-38.825, 12.75), (-38.825, 9.75), (-55.324839942, 9.75), align=None)
    extrude(amount=SALIENTE_EXTRUIR9_DEPTH)

    # Croquis39 → Saliente-Extruir10 (add)
    with BuildSketch(Plane.XZ.offset(-10)):
        Polygon((-38.825, 9.75), (-38.825, 7.75), (-38.825, 5.75), (-50.657959865, 5.75), (-52.991399903, 7.75), (-55.324839942, 9.75), align=None)
    extrude(amount=SALIENTE_EXTRUIR10_DEPTH)

    # Simetría3: body 2 across face


with BuildPart() as body_2_2:
    add(body_2_1.part)
    add(body_2_1.part.mirror(Plane(origin=(-18.003999227, 20, -4.220503046), x_dir=(0, 0, 1), z_dir=(0, 1, 0))))

    # Croquis40 → Cortar-Extruir36 (cut, two sides)
    with BuildSketch(Plane(origin=(0, 0, -20), x_dir=(-1, 0, 0), z_dir=(0, 0, -1))) as cortar_extruir36_sk:
        with Locations((22.395502026, -3.695757982)):
            Rectangle(CROQUIS40_W, CROQUIS40_H)
    extrude(amount=CORTAR_EXTRUIR36_DEPTH, mode=Mode.SUBTRACT)
    extrude(cortar_extruir36_sk.sketch, amount=-CORTAR_EXTRUIR36_DEPTH_BACK, mode=Mode.SUBTRACT)

    # Croquis41 → Cortar-Extruir37 (cut, two sides)
    with BuildSketch(Plane.XZ.offset(-20)) as cortar_extruir37_sk:
        Polygon((-19.992980133, -22.302484261), (-20, 3.75), (-24, 7.75), (-56.035110209, 7.75), align=None)
    extrude(amount=CORTAR_EXTRUIR37_DEPTH, mode=Mode.SUBTRACT)
    extrude(cortar_extruir37_sk.sketch, amount=-CORTAR_EXTRUIR37_DEPTH_BACK, mode=Mode.SUBTRACT)

    # Croquis42 → Cortar-Extruir38 (cut, two sides)
    with BuildSketch(Plane(origin=(0, 0, 9.75), x_dir=(-1, 0, 0), z_dir=(0, 0, -1))) as cortar_extruir38_sk:
        Polygon((46.720301378, 20), (46.720301378, 30), (38.825, 30), (33.492952769, 43.760628779), (49.525340398, 48.951442806), (67.200390695, 42.512205152), (65.906601328, 20), (51.713995885, 13.864168239), align=None)
    extrude(amount=CORTAR_EXTRUIR38_DEPTH, mode=Mode.SUBTRACT)
    extrude(cortar_extruir38_sk.sketch, amount=-CORTAR_EXTRUIR38_DEPTH_BACK, mode=Mode.SUBTRACT)

    # Croquis43 → Saliente-Extruir11 (add)
    with BuildSketch(Plane.XZ.offset(-20)):
        Polygon((-19.993600539, -20), (-46.720301378, 7.75), (-43.839252857, 10.524807997), (-17.112552018, -17.225192003), align=None)
    extrude(amount=-SALIENTE_EXTRUIR11_DEPTH)

    # Croquis44 → Cortar-Extruir39 (cut, through all)
    with BuildSketch(Plane(origin=(0, 0, 9.75), x_dir=(-1, 0, 0), z_dir=(0, 0, -1))):
        Polygon((38.957161657, 27.75), (37.369448416, 25), (38.957161657, 22.25), (42.132588137, 22.25), (43.720301378, 25), (42.132588137, 27.75), align=None)
    extrude(amount=CORTAR_EXTRUIR39_DEPTH, mode=Mode.SUBTRACT)

    # Croquis45 → Saliente-Extruir12 (add)
    with BuildSketch(Plane.XY.offset(12.75)):
        with Locations((-30.985150689, 25)):
            Rectangle(CROQUIS45_W, CROQUIS45_H)
        with Locations((-40.544874897, 25)):
            Circle(CROQUIS45_R, mode=Mode.SUBTRACT)
        with Locations((-29, 25)):
            Circle(CROQUIS45_R, mode=Mode.SUBTRACT)
    extrude(amount=SALIENTE_EXTRUIR12_DEPTH)

    # Croquis46 → Saliente-Extruir13 (add)
    with BuildSketch(Plane.XZ.offset(-20)):
        with BuildLine():
            Line((15.25, 0), (20, 0))
            Line((20, 0), (20, 15.25))
            Line((20, 15.25), (7.549834435, 15.25))
            Line((7.549834435, 15.25), (7.549834435, 13.25))
            ThreePointArc((7.549834435, 13.25), (13.185171124, 7.662490615), (15.25, 0))
        make_face()
        with BuildLine():
            Line((-15.25, 0), (-15.25, 15.25))
            Line((-15.25, 15.25), (-7.549834435, 15.25))
            Line((-7.549834435, 15.25), (-7.549834435, 13.25))
            ThreePointArc((-7.549834435, 13.25), (-13.185171124, 7.662490615), (-15.25, 0))
        make_face()
    extrude(amount=-SALIENTE_EXTRUIR13_DEPTH)

    # Croquis47 → Cortar-Extruir40 (cut)
    with BuildSketch(Plane.XY.offset(15.25).offset(CORTAR_EXTRUIR40_START)):
        Polygon((15.41228676, 22.352505966), (17, 25.102505966), (15.41228676, 27.852505966), (12.236860279, 27.852505966), (10.649147039, 25.102505966), (12.236860279, 22.352505966), align=None)
        with Locations((13.824573519, 25.102505966)):
            Circle(CROQUIS47_R, mode=Mode.SUBTRACT)
        Polygon((-12.236860279, 22.352505966), (-15.41228676, 22.352505966), (-17, 25.102505966), (-15.41228676, 27.852505966), (-12.236860279, 27.852505966), (-10.649147039, 25.102505966), align=None)
        with Locations(Location((-13.824573519, 25.102505966, 0), (0, 0, 131.421584744))):
            Circle(CROQUIS47_R, mode=Mode.SUBTRACT)
    extrude(amount=-CORTAR_EXTRUIR40_DEPTH, mode=Mode.SUBTRACT)

    # Croquis48 → Cortar-Extruir41 (cut)
    with BuildSketch(Plane.XY.offset(15.25).offset(CORTAR_EXTRUIR41_START)):
        with Locations((13.824573519, 25.102505966)):
            Circle(CROQUIS48_R)
        with Locations((-13.824573519, 25.102505966)):
            Circle(CROQUIS48_R)
    extrude(amount=CORTAR_EXTRUIR41_DEPTH, mode=Mode.SUBTRACT)

    # Croquis49 → Cortar-Extruir42 (cut)
    with BuildSketch(Plane(origin=(0, 30, 0), x_dir=(1, 0, 0), z_dir=(0, 1, 0))):
        Polygon((-12.979274058, 11.5), (-10.958548116, 15), (-12.979274058, 18.5), (-17.020725942, 18.5), (-19.041451884, 15), (-17.020725942, 11.5), align=None)
        Polygon((17.020725942, 11.5), (19.041451884, 15), (17.020725942, 18.5), (12.979274058, 18.5), (10.958548116, 15), (12.979274058, 11.5), align=None)
    extrude(amount=-CORTAR_EXTRUIR42_DEPTH, mode=Mode.SUBTRACT)

    # Croquis50 → Cortar-Extruir43 (cut, two sides)
    with BuildSketch(Plane(origin=(0, 30, 0), x_dir=(1, 0, 0), z_dir=(0, 1, 0))) as cortar_extruir43_sk:
        with Locations(Location((-15, 15, 0), (0, 0, 270))):
            Circle(CROQUIS50_R)
        with Locations(Location((15, 15, 0), (0, 0, 270))):
            Circle(CROQUIS50_R)
    extrude(amount=CORTAR_EXTRUIR43_DEPTH, mode=Mode.SUBTRACT)
    extrude(cortar_extruir43_sk.sketch, amount=-CORTAR_EXTRUIR43_DEPTH_BACK, mode=Mode.SUBTRACT)

    # Croquis51 → Cortar-Extruir44 (cut, two sides)
    with BuildSketch(Plane(origin=(0, 30, 0), x_dir=(1, 0, 0), z_dir=(0, 1, 0))) as cortar_extruir44_sk:
        Polygon((-35.175426481, -15.25), (-35.175426481, -7.75), (-19.995154673, 14.232221634), (-19.993600539, 20), (-53.730413568, 5.241110817), (-52.418444784, -16.738442517), align=None)
    extrude(amount=CORTAR_EXTRUIR44_DEPTH, mode=Mode.SUBTRACT)
    extrude(cortar_extruir44_sk.sketch, amount=-CORTAR_EXTRUIR44_DEPTH_BACK, mode=Mode.SUBTRACT)

    # Croquis52 → Saliente-Extruir14 (add)
    with BuildSketch(Plane(origin=(0, 30, 0), x_dir=(1, 0, 0), z_dir=(0, 1, 0))):
        Polygon((-35.175426481, -7.75), (-19.993600539, 20), (-20, -3.75), (-24, -7.75), align=None)
    extrude(amount=-SALIENTE_EXTRUIR14_DEPTH)

    # Croquis54 → Cortar-Extruir45 (cut)
    with BuildSketch(Plane.XY.offset(15.25).offset(CORTAR_EXTRUIR45_START)):
        Polygon((-25.824573519, 25), (-27.41228676, 27.75), (-30.58771324, 27.75), (-32.175426481, 25), (-30.58771324, 22.25), (-27.41228676, 22.25), align=None)
    extrude(amount=CORTAR_EXTRUIR45_DEPTH, mode=Mode.SUBTRACT)

    # Croquis55 → Cortar-Extruir46 (cut, two sides)
    with BuildSketch(Plane(origin=(0, 30, 0), x_dir=(1, 0, 0), z_dir=(0, 1, 0))) as cortar_extruir46_sk:
        with Locations((-34.055798451, -1.866866075)):
            Rectangle(CROQUIS55_W, CROQUIS55_H)
    extrude(amount=CORTAR_EXTRUIR46_DEPTH, mode=Mode.SUBTRACT)
    extrude(cortar_extruir46_sk.sketch, amount=-CORTAR_EXTRUIR46_DEPTH_BACK, mode=Mode.SUBTRACT)


solid = body_2_2.part
